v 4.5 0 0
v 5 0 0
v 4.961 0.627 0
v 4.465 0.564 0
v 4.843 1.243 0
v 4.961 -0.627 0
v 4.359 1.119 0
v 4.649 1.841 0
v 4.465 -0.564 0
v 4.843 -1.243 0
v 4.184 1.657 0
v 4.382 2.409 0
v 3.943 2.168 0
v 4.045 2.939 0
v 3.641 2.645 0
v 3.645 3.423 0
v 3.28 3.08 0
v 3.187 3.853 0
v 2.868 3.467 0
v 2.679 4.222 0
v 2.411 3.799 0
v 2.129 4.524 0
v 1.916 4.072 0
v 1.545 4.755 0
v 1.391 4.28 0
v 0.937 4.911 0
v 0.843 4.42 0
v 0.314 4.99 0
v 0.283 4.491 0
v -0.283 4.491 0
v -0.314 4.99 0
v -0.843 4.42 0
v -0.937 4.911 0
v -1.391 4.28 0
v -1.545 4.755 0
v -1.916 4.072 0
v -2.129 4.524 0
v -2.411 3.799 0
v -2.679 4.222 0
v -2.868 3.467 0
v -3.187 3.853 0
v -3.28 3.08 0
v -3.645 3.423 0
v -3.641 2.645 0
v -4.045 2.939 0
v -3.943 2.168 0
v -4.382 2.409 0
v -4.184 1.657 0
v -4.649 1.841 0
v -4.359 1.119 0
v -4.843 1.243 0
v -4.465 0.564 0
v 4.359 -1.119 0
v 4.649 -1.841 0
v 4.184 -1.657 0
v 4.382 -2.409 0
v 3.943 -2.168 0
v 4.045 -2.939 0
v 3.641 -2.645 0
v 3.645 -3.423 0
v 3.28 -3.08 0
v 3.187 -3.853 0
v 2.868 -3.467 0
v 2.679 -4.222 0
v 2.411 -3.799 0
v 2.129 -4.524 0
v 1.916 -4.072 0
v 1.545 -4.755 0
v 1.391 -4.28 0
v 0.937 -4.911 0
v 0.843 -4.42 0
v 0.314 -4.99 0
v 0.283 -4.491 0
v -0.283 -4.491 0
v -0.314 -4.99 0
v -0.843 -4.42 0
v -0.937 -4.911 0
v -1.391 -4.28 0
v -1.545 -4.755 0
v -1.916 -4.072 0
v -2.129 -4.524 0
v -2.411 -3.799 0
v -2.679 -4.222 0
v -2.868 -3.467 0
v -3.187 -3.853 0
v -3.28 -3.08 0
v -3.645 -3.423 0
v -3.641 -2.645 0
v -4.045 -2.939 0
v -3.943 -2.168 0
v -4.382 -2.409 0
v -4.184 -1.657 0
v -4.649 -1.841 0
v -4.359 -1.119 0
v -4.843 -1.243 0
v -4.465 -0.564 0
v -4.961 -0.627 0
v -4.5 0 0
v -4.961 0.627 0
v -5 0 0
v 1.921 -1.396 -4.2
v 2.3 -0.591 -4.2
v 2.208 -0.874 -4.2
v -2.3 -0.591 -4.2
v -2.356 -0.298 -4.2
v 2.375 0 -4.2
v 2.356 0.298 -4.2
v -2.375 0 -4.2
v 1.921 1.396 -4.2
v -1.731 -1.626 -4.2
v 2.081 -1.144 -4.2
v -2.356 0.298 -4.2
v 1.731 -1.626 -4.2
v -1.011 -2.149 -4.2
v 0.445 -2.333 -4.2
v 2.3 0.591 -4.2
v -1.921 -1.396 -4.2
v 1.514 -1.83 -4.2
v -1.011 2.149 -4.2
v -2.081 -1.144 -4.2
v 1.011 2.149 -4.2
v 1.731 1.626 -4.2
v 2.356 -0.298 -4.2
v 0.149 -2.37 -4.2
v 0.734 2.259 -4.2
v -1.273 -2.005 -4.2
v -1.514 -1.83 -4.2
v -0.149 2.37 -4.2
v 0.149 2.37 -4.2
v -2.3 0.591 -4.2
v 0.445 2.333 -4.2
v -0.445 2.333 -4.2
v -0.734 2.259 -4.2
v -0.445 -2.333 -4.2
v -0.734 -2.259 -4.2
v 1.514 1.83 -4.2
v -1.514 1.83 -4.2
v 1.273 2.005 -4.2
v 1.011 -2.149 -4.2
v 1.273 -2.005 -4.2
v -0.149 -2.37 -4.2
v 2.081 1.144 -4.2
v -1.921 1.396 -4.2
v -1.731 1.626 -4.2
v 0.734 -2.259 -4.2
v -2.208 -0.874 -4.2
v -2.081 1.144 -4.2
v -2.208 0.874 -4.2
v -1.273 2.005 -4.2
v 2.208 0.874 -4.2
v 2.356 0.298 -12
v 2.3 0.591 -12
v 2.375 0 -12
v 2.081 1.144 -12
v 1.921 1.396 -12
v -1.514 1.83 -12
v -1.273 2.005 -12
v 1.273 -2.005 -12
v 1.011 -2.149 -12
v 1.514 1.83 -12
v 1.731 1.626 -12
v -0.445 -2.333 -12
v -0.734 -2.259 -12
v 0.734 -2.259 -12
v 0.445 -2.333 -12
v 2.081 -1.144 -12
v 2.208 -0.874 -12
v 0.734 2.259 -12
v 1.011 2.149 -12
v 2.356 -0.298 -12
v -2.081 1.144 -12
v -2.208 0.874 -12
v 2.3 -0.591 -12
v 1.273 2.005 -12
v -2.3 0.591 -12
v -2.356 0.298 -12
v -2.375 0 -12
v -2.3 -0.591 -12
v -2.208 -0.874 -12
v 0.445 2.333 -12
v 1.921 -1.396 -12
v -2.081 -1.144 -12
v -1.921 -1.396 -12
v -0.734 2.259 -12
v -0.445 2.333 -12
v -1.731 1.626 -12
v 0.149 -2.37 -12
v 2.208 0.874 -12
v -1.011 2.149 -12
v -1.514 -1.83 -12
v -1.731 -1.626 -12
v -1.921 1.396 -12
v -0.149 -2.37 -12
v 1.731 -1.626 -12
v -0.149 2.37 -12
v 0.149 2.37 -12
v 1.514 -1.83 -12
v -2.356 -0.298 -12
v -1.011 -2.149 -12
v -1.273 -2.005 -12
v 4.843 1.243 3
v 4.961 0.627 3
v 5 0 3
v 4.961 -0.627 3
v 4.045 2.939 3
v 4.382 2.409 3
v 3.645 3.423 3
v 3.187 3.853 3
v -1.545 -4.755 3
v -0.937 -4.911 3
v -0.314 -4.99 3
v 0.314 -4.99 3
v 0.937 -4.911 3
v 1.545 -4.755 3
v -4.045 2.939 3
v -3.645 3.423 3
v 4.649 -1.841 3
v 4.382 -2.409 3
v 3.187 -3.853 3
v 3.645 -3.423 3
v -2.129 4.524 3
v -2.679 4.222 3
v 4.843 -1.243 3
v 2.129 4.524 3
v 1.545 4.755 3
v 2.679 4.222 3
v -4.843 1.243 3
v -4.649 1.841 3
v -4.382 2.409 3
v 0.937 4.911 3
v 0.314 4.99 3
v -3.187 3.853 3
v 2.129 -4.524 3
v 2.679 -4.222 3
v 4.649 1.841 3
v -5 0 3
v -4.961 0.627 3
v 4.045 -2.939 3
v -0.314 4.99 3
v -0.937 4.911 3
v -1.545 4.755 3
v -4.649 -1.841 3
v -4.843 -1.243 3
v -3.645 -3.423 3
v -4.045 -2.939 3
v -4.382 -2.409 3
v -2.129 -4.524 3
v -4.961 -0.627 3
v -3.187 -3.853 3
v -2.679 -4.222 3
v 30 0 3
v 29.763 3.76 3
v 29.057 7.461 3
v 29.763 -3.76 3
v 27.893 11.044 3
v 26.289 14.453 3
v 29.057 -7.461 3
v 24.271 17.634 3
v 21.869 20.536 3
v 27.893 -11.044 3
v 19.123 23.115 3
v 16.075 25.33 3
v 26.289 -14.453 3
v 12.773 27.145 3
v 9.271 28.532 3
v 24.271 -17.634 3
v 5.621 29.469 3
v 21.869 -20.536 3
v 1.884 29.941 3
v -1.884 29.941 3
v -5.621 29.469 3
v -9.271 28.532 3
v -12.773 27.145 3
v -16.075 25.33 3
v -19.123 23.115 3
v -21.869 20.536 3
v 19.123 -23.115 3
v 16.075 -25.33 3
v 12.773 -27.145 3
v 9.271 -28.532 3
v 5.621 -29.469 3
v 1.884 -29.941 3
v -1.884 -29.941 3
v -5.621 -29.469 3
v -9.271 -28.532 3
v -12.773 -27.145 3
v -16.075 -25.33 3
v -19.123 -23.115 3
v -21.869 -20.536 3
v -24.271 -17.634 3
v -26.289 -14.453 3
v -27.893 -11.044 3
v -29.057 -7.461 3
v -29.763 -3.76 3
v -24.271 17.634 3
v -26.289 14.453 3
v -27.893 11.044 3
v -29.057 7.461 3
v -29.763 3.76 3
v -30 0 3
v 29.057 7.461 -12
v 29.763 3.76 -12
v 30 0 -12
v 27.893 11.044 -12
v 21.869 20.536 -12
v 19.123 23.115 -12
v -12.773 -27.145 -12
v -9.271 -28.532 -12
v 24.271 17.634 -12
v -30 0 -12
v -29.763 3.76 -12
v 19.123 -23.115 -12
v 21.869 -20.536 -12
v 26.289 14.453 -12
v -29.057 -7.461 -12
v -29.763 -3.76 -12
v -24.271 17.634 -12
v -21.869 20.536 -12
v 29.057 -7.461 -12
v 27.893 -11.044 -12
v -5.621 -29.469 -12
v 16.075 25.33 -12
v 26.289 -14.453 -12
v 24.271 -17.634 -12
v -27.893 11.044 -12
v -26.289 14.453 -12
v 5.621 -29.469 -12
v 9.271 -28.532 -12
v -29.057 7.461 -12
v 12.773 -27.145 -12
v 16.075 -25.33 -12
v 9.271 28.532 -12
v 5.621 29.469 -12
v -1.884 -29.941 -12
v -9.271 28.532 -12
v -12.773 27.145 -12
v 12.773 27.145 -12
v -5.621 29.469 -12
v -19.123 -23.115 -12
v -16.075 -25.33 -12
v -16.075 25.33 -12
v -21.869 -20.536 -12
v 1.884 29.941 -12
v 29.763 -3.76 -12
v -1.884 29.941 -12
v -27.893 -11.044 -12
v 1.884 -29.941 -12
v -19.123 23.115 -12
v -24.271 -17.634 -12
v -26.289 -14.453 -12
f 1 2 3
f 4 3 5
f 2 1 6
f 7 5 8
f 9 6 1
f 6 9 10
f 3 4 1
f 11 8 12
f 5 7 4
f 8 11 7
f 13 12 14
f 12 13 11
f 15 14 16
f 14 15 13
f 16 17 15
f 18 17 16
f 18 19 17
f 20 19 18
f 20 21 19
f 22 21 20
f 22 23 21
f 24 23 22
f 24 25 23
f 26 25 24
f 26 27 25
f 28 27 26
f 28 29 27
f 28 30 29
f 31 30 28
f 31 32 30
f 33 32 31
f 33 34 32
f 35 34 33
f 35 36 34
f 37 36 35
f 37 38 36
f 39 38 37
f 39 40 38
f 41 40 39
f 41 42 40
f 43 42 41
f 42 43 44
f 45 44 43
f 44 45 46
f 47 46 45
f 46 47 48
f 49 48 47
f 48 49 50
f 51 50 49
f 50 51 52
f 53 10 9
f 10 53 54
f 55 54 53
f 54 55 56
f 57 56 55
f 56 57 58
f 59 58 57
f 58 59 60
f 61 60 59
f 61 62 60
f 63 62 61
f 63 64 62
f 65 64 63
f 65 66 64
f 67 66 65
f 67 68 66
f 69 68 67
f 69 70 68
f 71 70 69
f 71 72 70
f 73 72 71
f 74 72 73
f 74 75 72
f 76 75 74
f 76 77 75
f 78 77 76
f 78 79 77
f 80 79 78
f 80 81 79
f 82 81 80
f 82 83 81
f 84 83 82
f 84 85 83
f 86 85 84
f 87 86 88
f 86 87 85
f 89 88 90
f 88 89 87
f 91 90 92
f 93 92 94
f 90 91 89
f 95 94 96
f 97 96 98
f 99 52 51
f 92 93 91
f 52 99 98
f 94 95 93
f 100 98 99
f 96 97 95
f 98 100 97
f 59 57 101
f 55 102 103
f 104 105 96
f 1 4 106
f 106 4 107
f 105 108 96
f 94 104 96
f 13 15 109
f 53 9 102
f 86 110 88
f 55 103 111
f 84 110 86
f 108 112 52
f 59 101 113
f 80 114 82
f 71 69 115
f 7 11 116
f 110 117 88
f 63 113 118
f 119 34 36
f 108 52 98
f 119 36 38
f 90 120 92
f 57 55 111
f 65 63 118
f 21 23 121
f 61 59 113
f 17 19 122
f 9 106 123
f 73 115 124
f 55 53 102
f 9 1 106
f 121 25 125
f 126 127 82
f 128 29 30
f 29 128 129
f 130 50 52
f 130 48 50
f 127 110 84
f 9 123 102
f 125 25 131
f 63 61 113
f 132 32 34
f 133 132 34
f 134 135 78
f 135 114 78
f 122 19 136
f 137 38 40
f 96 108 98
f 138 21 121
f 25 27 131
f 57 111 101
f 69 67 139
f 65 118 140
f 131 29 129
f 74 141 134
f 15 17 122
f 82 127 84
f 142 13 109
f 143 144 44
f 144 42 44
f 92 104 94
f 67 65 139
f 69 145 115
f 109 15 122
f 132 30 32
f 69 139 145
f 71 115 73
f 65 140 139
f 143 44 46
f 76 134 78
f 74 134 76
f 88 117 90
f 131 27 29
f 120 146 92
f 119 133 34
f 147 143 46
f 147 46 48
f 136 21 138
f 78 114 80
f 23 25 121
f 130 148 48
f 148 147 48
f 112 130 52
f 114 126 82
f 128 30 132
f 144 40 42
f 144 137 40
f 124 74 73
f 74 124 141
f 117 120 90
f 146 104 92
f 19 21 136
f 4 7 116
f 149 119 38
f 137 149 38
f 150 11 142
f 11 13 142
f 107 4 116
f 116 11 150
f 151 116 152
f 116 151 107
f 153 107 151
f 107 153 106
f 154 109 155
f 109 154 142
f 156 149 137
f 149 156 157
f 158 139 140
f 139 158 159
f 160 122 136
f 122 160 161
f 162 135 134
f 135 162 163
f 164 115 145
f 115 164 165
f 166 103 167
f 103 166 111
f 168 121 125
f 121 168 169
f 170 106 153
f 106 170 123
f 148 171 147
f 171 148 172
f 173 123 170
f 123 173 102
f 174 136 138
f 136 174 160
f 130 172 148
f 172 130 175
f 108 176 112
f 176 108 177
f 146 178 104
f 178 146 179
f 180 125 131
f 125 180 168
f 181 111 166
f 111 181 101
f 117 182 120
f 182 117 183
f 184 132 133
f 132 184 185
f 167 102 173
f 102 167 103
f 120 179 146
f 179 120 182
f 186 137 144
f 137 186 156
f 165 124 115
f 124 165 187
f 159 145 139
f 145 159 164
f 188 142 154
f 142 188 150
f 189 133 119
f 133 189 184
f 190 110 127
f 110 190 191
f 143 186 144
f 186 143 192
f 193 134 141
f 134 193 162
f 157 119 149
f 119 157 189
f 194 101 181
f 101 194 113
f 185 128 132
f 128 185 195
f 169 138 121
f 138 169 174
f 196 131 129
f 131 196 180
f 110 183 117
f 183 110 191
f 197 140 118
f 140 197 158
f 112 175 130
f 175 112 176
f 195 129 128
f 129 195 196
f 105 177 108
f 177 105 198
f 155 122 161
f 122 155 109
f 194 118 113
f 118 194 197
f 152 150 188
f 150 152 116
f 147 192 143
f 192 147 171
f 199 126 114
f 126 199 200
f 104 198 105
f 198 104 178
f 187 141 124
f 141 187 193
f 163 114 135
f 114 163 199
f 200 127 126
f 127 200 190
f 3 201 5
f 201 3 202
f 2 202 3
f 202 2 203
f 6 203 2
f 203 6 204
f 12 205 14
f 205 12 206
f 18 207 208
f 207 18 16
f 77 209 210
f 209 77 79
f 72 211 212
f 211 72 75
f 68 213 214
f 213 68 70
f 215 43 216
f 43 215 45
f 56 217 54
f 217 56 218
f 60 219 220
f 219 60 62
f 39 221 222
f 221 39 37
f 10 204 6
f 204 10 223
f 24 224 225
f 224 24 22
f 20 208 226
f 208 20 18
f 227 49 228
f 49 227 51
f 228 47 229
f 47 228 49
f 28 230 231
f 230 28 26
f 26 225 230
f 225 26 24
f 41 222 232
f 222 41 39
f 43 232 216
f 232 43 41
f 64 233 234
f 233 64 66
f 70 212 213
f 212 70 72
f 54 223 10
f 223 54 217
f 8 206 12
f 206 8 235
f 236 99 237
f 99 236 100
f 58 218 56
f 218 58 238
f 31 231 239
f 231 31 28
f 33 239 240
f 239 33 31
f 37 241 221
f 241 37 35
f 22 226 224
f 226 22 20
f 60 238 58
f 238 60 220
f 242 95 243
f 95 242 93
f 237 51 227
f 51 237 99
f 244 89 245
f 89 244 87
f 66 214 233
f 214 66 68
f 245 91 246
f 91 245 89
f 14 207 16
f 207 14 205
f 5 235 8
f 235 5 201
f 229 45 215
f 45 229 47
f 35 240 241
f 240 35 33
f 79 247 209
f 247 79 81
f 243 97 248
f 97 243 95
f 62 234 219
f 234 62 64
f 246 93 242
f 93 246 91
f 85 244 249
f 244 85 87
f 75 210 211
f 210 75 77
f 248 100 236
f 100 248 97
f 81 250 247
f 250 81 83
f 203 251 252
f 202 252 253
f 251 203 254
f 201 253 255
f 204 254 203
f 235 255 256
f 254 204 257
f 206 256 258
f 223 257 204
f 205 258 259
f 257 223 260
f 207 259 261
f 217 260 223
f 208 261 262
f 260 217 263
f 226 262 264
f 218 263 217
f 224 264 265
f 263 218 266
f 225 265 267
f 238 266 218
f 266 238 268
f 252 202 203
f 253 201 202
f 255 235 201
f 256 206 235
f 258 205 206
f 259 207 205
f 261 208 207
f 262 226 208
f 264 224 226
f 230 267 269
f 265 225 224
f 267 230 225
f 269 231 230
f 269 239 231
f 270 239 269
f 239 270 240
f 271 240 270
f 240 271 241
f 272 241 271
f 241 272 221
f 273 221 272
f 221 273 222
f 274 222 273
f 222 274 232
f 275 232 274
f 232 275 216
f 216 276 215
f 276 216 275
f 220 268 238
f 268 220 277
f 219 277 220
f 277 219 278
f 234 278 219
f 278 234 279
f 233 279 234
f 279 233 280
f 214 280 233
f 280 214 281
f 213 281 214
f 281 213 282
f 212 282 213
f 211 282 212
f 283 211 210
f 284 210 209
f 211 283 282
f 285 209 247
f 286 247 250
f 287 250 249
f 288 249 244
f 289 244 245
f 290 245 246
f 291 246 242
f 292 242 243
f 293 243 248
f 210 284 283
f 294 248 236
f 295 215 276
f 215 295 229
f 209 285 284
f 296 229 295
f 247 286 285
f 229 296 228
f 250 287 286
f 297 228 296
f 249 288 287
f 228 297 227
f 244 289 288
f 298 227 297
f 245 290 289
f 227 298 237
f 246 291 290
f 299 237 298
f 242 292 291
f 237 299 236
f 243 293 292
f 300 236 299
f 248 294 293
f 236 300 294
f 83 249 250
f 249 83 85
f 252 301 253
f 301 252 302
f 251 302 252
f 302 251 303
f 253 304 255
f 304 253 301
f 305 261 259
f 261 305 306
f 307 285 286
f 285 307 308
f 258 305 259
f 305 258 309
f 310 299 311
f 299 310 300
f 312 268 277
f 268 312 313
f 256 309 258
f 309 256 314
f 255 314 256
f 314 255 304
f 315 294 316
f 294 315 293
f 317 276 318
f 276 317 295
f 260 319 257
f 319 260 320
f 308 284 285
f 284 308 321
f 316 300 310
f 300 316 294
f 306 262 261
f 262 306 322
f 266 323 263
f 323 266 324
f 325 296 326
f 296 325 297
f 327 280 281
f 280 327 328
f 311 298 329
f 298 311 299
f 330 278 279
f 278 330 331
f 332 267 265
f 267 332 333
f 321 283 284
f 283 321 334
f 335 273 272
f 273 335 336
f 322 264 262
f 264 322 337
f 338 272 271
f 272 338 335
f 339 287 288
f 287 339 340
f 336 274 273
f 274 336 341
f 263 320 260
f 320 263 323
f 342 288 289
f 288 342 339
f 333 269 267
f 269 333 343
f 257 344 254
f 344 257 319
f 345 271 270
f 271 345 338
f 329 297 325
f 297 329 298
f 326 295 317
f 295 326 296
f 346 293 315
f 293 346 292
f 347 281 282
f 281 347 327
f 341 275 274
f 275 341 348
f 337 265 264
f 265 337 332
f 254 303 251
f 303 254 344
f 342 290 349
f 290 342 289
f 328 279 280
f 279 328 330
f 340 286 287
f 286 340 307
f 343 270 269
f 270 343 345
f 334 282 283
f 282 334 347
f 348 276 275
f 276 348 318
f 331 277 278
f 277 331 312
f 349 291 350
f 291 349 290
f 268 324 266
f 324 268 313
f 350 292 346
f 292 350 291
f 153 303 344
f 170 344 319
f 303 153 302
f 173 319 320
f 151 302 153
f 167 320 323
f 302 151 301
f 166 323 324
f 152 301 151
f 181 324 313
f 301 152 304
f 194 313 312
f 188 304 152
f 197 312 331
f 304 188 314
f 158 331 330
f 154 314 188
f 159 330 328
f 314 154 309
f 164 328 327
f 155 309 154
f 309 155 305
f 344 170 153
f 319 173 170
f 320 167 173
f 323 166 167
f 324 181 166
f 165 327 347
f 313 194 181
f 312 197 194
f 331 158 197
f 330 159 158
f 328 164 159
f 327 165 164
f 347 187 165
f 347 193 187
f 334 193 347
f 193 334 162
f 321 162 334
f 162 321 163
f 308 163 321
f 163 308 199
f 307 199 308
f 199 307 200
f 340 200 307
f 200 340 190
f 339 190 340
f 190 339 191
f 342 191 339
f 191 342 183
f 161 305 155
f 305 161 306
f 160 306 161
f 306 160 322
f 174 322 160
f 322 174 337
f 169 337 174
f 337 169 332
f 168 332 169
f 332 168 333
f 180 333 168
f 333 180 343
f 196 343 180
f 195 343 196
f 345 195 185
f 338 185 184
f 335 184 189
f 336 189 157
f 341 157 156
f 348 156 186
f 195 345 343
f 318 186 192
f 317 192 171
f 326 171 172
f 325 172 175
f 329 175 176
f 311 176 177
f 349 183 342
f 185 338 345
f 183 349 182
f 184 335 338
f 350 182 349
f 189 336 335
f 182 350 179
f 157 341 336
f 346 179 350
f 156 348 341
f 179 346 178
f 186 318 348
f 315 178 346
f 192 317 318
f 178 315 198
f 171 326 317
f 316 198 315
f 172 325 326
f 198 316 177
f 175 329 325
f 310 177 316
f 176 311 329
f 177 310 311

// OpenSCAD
$fn = 50;

difference() {
	union() {
		translate(v = [0, 0, -12.0]) {
			cylinder(h = 15, r = 30.0);
		}
	}
	union() {
		translate(v = [0, 0, 0]) {
			rotate(a = [0, 0, 0]) {
				difference() {
					union() {
						translate(v = [0, 0, -15.0]) {
							cylinder(h = 15, r = 2.25);
						}
						translate(v = [0, 0, -4.2]) {
							cylinder(h = 4.2, r1 = 2.375, r2 = 4.5);
						}
						translate(v = [0, 0, -15.0]) {
							cylinder(h = 15, r = 2.375);
						}
						translate(v = [0, 0, -15.0]) {
							cylinder(h = 15, r = 2.25);
						}
					}
					union();
				}
			}
		}
		#cylinder(h = 3, r = 5.0);
	}
}
